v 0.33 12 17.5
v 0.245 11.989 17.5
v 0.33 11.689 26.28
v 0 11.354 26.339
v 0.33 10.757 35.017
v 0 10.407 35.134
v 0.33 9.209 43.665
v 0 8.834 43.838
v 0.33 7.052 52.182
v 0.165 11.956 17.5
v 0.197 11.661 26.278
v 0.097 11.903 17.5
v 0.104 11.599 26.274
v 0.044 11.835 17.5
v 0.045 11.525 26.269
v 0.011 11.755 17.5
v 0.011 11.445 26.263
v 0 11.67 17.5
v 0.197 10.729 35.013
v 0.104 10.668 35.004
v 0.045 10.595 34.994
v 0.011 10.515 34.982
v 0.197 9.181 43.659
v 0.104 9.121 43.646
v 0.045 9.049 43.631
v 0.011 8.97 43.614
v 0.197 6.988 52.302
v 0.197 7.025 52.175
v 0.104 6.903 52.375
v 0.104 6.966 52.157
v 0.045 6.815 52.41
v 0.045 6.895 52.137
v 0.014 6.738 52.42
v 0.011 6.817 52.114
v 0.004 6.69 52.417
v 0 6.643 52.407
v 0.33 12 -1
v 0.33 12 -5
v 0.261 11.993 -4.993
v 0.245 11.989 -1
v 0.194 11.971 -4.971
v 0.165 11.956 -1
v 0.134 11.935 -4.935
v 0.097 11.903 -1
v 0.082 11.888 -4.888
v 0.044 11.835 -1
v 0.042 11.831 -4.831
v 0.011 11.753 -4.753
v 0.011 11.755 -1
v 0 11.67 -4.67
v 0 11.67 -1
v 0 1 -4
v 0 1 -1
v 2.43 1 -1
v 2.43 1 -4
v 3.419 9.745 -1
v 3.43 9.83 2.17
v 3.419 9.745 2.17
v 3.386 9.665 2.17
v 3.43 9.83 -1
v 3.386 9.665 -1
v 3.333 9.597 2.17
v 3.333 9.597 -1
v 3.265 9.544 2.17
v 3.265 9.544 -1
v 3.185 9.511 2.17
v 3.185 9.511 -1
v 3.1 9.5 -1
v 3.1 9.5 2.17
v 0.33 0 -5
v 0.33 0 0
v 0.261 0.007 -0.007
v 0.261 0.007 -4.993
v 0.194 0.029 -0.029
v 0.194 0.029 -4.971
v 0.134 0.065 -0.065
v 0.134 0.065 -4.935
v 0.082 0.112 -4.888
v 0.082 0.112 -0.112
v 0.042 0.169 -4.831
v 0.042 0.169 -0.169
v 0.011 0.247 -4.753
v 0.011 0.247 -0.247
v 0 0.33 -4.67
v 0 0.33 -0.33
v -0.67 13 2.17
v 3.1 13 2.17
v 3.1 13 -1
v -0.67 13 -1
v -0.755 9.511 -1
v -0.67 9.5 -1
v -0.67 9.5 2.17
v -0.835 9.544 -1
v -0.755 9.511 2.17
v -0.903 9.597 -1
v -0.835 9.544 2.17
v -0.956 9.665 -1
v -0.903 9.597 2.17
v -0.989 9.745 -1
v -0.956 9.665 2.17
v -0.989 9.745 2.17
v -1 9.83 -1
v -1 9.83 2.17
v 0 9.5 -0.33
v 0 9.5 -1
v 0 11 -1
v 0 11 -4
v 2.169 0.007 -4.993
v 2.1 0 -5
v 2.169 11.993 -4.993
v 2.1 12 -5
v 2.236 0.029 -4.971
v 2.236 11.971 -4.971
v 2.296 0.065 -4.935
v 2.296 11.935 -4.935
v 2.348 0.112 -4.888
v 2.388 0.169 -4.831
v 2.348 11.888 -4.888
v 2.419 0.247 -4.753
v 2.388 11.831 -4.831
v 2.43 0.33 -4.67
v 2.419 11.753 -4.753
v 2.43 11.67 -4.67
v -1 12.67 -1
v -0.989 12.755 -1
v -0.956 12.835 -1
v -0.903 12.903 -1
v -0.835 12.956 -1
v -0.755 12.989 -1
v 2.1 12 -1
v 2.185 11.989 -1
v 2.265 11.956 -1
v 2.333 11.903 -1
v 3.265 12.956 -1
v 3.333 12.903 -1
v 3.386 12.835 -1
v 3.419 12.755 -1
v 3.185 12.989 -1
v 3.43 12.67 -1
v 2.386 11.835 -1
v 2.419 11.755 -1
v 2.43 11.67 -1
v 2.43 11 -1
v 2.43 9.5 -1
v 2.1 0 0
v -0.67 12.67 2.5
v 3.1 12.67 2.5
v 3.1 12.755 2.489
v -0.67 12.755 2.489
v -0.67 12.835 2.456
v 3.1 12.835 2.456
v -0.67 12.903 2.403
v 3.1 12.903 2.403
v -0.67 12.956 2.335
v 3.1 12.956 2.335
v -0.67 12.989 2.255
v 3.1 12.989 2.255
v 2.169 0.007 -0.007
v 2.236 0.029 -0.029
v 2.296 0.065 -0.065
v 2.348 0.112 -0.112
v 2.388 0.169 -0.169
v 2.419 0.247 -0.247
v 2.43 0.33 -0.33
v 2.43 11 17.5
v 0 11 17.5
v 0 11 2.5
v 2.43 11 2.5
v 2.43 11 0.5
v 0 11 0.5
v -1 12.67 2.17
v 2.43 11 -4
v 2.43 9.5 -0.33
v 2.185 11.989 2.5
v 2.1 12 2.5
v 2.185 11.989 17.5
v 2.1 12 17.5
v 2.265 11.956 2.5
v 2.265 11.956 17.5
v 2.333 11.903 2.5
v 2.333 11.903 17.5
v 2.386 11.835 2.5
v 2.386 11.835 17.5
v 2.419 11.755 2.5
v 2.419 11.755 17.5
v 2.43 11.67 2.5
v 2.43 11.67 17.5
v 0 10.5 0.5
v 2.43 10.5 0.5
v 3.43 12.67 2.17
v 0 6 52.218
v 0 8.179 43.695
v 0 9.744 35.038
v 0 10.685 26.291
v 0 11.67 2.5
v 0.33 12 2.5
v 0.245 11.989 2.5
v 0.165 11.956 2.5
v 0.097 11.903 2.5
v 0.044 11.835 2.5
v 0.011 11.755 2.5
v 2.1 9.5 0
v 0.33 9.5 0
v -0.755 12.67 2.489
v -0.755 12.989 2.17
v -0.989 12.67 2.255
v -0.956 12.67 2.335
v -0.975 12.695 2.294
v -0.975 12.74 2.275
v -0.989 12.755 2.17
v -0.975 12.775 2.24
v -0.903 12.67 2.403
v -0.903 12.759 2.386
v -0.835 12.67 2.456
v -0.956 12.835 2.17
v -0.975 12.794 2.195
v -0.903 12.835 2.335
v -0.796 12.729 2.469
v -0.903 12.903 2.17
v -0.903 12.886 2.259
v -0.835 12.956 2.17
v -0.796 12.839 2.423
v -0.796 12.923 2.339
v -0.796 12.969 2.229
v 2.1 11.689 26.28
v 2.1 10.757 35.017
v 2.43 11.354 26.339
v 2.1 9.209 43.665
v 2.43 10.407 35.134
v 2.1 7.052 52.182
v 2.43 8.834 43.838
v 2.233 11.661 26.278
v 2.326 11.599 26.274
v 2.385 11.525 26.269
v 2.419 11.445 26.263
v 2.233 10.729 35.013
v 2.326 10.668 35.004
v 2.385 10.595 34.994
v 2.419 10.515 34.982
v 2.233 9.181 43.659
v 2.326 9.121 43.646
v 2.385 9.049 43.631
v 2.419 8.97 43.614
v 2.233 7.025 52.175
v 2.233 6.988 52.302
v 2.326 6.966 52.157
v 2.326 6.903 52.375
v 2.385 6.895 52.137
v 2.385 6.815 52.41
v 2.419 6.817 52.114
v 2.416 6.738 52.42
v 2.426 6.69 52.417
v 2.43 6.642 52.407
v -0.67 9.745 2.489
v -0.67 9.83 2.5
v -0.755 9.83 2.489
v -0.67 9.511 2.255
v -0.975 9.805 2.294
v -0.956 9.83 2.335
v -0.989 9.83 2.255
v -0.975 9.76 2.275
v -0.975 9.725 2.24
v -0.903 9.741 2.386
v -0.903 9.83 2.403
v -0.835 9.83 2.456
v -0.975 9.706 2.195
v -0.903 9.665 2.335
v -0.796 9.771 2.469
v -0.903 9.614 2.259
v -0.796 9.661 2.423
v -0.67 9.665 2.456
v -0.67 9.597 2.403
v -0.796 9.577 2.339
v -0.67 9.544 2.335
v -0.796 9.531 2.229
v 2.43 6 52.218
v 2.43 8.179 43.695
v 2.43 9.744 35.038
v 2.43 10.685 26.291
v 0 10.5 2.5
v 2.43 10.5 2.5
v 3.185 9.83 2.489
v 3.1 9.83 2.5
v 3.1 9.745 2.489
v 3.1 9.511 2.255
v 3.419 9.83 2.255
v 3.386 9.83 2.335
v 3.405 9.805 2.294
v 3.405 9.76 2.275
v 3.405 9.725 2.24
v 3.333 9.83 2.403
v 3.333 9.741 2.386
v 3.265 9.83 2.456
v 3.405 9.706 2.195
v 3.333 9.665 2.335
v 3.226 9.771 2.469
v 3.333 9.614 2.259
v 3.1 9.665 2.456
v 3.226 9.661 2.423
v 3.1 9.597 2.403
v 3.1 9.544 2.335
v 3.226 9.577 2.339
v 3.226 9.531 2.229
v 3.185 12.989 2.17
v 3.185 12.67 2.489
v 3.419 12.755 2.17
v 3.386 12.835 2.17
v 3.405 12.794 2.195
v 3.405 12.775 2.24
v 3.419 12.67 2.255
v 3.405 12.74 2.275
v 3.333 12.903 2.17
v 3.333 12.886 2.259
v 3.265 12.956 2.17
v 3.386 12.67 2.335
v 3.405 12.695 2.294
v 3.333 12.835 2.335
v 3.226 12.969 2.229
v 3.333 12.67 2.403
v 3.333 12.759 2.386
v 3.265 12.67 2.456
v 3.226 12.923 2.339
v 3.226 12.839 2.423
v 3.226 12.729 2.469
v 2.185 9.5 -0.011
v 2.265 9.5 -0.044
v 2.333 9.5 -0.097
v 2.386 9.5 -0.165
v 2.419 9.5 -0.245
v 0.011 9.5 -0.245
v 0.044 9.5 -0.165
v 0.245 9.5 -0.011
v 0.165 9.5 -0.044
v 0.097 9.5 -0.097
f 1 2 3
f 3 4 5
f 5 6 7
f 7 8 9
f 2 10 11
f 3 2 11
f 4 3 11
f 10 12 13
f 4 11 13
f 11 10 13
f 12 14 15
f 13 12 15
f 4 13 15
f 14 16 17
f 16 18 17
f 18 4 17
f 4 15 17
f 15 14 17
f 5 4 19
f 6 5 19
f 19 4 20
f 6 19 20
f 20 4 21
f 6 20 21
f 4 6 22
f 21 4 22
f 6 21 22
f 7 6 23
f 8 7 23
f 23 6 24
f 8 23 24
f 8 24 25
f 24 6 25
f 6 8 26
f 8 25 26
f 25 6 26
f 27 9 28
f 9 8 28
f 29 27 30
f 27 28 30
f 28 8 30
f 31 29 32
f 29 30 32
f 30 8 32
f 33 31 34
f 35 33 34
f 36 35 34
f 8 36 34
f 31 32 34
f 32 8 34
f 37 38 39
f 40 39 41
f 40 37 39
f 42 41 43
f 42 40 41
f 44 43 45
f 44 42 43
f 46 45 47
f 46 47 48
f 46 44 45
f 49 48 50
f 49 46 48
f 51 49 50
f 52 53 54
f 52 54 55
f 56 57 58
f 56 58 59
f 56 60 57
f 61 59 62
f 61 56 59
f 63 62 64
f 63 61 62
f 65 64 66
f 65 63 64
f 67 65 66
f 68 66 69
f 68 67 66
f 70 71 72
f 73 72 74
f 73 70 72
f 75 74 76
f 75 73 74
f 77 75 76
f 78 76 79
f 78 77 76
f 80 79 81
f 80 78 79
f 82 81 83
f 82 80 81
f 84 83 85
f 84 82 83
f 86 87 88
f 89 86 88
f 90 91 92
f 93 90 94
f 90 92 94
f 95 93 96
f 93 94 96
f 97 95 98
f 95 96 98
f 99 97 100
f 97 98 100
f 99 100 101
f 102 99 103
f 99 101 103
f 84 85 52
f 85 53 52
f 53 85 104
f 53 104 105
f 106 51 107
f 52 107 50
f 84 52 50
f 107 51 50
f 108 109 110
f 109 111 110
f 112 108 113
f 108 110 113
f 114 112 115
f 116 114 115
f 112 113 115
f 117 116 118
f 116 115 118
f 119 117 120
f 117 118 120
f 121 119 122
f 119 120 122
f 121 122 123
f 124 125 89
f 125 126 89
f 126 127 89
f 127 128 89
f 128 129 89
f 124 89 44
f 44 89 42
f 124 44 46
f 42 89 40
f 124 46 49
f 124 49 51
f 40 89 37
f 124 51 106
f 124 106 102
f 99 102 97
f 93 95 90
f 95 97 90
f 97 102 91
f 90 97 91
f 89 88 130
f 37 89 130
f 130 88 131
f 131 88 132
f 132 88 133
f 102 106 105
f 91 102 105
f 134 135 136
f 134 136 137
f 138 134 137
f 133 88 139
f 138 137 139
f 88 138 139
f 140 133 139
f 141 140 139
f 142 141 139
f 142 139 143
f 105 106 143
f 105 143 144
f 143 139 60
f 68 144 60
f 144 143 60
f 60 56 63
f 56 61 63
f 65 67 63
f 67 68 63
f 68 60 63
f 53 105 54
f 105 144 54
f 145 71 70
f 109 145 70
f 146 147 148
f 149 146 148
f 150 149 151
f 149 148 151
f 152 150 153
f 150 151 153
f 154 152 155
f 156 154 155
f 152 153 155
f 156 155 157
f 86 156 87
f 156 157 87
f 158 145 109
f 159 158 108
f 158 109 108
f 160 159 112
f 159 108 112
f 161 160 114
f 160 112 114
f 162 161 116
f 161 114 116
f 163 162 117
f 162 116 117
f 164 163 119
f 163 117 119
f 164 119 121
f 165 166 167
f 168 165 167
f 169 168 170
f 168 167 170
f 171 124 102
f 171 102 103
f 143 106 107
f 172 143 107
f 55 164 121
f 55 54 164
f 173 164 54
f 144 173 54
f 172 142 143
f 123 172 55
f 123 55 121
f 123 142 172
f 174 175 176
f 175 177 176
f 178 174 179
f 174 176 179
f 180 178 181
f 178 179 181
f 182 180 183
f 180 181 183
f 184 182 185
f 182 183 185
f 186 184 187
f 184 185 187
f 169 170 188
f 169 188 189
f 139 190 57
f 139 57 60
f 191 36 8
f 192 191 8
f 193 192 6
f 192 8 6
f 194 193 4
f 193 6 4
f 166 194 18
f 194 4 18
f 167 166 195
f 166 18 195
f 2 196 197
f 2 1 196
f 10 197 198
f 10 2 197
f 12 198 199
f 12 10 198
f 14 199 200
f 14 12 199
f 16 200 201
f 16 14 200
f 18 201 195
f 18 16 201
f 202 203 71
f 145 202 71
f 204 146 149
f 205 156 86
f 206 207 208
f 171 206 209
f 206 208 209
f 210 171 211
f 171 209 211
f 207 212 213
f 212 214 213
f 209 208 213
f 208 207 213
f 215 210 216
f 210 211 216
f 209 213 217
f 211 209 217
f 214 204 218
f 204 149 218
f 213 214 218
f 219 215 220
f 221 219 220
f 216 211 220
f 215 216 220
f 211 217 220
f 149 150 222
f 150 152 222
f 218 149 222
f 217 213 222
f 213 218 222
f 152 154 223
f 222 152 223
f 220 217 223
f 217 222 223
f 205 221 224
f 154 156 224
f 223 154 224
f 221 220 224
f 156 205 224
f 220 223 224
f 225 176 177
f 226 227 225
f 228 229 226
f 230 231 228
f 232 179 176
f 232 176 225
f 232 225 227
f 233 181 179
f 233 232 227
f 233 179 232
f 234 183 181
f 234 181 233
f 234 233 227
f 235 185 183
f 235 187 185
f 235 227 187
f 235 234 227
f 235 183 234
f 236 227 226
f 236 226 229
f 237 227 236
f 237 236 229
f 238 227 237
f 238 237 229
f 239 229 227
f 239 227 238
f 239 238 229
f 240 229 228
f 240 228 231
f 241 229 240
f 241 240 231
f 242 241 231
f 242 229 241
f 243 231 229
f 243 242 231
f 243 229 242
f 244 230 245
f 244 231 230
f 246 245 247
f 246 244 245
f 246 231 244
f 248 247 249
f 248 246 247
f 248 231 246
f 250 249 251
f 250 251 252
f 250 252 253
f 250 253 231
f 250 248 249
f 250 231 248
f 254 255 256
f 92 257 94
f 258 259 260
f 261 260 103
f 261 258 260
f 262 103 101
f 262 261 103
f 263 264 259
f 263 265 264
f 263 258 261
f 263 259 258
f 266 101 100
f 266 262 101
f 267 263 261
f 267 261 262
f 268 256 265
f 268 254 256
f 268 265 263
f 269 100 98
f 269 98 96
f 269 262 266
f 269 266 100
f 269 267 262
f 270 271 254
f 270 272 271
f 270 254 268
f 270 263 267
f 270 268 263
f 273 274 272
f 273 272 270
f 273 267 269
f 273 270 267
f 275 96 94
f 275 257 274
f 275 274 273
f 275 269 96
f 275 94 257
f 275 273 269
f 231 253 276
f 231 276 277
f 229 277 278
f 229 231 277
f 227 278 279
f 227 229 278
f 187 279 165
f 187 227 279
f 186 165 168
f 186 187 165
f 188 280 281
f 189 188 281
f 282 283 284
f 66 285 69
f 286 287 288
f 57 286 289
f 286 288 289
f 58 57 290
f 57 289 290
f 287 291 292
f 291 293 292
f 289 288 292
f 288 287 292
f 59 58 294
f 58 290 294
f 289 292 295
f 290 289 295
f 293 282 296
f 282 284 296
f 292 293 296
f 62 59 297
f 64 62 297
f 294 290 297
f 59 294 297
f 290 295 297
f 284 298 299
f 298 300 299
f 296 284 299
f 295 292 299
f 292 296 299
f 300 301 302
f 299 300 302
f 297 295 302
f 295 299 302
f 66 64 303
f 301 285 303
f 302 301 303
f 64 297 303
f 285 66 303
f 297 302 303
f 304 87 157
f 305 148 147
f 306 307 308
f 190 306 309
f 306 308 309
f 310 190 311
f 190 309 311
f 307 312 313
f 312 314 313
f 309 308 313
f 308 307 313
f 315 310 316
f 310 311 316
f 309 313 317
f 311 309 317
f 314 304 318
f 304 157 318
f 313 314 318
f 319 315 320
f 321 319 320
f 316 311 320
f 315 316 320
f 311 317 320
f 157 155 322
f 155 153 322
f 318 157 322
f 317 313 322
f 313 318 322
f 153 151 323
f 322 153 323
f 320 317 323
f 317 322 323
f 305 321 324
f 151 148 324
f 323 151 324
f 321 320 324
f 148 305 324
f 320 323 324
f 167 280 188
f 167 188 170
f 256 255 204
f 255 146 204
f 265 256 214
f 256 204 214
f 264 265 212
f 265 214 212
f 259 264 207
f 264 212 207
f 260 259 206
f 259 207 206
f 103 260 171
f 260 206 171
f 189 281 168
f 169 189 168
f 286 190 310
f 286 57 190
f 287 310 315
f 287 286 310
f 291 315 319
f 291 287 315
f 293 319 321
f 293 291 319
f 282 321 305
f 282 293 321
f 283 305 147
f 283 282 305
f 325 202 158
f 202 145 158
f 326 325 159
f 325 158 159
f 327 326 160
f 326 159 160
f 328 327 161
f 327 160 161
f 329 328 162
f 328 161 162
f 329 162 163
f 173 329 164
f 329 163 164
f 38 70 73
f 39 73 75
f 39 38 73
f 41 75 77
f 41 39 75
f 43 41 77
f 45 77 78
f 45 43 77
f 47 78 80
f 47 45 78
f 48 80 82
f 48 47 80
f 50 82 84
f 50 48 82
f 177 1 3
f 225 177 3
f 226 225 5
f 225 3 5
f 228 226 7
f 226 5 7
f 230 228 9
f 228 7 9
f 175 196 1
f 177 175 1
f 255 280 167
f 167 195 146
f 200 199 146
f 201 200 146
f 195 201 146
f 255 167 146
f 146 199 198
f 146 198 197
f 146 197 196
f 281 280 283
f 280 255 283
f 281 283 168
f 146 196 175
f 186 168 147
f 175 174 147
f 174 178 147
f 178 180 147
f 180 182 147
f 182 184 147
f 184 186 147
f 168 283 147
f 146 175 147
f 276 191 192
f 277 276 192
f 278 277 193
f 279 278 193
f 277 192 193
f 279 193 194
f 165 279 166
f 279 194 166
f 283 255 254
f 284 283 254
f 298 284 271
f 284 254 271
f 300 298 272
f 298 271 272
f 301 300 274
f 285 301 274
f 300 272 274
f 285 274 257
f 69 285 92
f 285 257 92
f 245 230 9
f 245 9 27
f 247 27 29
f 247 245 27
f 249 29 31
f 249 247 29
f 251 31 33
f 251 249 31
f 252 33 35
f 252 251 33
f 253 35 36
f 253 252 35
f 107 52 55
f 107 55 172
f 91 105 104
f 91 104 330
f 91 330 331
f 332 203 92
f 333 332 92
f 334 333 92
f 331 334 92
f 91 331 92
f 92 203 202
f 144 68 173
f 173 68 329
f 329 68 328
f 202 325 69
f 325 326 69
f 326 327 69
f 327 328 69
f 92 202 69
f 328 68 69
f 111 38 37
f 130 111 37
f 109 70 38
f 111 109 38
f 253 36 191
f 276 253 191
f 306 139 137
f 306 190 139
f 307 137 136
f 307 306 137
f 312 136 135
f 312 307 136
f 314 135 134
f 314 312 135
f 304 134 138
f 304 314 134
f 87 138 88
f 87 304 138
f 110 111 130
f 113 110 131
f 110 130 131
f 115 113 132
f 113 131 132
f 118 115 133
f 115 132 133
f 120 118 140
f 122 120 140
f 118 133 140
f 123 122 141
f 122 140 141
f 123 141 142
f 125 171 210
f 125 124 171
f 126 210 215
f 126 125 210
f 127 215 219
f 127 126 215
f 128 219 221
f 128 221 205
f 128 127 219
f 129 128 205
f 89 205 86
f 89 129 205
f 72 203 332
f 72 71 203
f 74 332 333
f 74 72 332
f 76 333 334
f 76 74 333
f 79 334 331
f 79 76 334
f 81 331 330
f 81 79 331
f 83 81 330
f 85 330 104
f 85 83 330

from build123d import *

# Parameters (mm, degrees)
ESQUISSE1_W             = 3
ESQUISSE1_H             = 10
BOSS_EXTRU_1_DEPTH      = 2.43
BOSS_EXTRU_2_DEPTH      = 1
BOSS_EXTRU_3_DEPTH      = 1
CONG_1_R                = 0.33
ESQUISSE4_W             = 2.43
ESQUISSE4_H             = 0.5
ENL_V_MAT_EXTRU_1_DEPTH = 2


with BuildPart() as part:
    # Esquisse1 → Boss.-Extru.1 (new body)
    # profile 1 of 2: a face of its own
    with BuildSketch(Plane(origin=(0, 0, 0), x_dir=(0, 0, -1), z_dir=(1, 0, 0))):
        Polygon((1, 12), (1, 13), (-2.5, 13), (-2.5, 12), (-17.5, 12), (-17.5, 11), (-2.5, 11), (-2.5, 9.5), (0, 9.5), (0, 0), (5, 0), (5, 12), align=None)
        with Locations((2.5, 6)):
            Rectangle(ESQUISSE1_W, ESQUISSE1_H, mode=Mode.SUBTRACT)
    # profile 2 of 2: a face of its own
    with BuildSketch(Plane(origin=(0, 0, 0), x_dir=(0, 0, -1), z_dir=(1, 0, 0))):
        with BuildLine():
            Line((-52.5, 6.95936039), (-52.217816297, 6))
            ThreePointArc((-52.217816297, 6), (-35.038007074, 9.743584715), (-17.5, 11))
            Line((-17.5, 11), (-17.5, 12))
            ThreePointArc((-17.5, 12), (-35.180554627, 10.73337267), (-52.5, 6.95936039))
        make_face()
    extrude(amount=BOSS_EXTRU_1_DEPTH)

    # Esquisse2 → Boss.-Extru.2 (add)
    with BuildSketch(Plane(origin=(2.43, 0, 0), x_dir=(0, 0, -1), z_dir=(1, 0, 0))):
        Polygon((-2.5, 13), (-2.5, 12), (-2.5, 11), (-2.5, 9.5), (0, 9.5), (1, 9.5), (1, 12), (1, 13), align=None)
    extrude(amount=BOSS_EXTRU_2_DEPTH)

    # Esquisse3 → Boss.-Extru.3 (add)
    with BuildSketch(Plane.ZY):
        Polygon((-1, 13), (-1, 12), (-1, 9.5), (0, 9.5), (2.5, 9.5), (2.5, 11), (2.5, 12), (2.5, 13), align=None)
    extrude(amount=BOSS_EXTRU_3_DEPTH)

    # Congé1
    cong_1_edges = [part.edges().sort_by_distance(p)[0] for p in [
        (0, 12, -3),
        (0, 6, -5),
        (0, 0, -2.5),
        (0, 4.75, 0),
        (0, 10.73337267, 35.180554627),
        (0, 12, 10),
        (1.215, 9.5, 2.5),
        (1.215, 6.95936039, 52.5),
        (1.215, 13, 2.5),
        (2.43, 12, 10),
        (2.43, 10.73337267, 35.180554627),
        (3.43, 13, 0.75),
        (3.43, 11.25, 2.5),
        (3.43, 9.5, 0.75),
        (2.43, 4.75, 0),
        (2.43, 0, -2.5),
        (2.43, 6, -5),
        (-1, 11.25, 2.5),
        (-1, 13, 0.75),
        (-1, 9.5, 0.75),
        (2.43, 12, -3),
    ]]
    fillet(cong_1_edges, radius=CONG_1_R)

    # Esquisse4 → Enlèv. mat.-Extru.1 (cut)
    with BuildSketch(Plane.XY.offset(2.5)):
        with Locations((1.215, 10.75)):
            Rectangle(ESQUISSE4_W, ESQUISSE4_H)
    extrude(amount=-ENL_V_MAT_EXTRU_1_DEPTH, mode=Mode.SUBTRACT)


solid = part.part
